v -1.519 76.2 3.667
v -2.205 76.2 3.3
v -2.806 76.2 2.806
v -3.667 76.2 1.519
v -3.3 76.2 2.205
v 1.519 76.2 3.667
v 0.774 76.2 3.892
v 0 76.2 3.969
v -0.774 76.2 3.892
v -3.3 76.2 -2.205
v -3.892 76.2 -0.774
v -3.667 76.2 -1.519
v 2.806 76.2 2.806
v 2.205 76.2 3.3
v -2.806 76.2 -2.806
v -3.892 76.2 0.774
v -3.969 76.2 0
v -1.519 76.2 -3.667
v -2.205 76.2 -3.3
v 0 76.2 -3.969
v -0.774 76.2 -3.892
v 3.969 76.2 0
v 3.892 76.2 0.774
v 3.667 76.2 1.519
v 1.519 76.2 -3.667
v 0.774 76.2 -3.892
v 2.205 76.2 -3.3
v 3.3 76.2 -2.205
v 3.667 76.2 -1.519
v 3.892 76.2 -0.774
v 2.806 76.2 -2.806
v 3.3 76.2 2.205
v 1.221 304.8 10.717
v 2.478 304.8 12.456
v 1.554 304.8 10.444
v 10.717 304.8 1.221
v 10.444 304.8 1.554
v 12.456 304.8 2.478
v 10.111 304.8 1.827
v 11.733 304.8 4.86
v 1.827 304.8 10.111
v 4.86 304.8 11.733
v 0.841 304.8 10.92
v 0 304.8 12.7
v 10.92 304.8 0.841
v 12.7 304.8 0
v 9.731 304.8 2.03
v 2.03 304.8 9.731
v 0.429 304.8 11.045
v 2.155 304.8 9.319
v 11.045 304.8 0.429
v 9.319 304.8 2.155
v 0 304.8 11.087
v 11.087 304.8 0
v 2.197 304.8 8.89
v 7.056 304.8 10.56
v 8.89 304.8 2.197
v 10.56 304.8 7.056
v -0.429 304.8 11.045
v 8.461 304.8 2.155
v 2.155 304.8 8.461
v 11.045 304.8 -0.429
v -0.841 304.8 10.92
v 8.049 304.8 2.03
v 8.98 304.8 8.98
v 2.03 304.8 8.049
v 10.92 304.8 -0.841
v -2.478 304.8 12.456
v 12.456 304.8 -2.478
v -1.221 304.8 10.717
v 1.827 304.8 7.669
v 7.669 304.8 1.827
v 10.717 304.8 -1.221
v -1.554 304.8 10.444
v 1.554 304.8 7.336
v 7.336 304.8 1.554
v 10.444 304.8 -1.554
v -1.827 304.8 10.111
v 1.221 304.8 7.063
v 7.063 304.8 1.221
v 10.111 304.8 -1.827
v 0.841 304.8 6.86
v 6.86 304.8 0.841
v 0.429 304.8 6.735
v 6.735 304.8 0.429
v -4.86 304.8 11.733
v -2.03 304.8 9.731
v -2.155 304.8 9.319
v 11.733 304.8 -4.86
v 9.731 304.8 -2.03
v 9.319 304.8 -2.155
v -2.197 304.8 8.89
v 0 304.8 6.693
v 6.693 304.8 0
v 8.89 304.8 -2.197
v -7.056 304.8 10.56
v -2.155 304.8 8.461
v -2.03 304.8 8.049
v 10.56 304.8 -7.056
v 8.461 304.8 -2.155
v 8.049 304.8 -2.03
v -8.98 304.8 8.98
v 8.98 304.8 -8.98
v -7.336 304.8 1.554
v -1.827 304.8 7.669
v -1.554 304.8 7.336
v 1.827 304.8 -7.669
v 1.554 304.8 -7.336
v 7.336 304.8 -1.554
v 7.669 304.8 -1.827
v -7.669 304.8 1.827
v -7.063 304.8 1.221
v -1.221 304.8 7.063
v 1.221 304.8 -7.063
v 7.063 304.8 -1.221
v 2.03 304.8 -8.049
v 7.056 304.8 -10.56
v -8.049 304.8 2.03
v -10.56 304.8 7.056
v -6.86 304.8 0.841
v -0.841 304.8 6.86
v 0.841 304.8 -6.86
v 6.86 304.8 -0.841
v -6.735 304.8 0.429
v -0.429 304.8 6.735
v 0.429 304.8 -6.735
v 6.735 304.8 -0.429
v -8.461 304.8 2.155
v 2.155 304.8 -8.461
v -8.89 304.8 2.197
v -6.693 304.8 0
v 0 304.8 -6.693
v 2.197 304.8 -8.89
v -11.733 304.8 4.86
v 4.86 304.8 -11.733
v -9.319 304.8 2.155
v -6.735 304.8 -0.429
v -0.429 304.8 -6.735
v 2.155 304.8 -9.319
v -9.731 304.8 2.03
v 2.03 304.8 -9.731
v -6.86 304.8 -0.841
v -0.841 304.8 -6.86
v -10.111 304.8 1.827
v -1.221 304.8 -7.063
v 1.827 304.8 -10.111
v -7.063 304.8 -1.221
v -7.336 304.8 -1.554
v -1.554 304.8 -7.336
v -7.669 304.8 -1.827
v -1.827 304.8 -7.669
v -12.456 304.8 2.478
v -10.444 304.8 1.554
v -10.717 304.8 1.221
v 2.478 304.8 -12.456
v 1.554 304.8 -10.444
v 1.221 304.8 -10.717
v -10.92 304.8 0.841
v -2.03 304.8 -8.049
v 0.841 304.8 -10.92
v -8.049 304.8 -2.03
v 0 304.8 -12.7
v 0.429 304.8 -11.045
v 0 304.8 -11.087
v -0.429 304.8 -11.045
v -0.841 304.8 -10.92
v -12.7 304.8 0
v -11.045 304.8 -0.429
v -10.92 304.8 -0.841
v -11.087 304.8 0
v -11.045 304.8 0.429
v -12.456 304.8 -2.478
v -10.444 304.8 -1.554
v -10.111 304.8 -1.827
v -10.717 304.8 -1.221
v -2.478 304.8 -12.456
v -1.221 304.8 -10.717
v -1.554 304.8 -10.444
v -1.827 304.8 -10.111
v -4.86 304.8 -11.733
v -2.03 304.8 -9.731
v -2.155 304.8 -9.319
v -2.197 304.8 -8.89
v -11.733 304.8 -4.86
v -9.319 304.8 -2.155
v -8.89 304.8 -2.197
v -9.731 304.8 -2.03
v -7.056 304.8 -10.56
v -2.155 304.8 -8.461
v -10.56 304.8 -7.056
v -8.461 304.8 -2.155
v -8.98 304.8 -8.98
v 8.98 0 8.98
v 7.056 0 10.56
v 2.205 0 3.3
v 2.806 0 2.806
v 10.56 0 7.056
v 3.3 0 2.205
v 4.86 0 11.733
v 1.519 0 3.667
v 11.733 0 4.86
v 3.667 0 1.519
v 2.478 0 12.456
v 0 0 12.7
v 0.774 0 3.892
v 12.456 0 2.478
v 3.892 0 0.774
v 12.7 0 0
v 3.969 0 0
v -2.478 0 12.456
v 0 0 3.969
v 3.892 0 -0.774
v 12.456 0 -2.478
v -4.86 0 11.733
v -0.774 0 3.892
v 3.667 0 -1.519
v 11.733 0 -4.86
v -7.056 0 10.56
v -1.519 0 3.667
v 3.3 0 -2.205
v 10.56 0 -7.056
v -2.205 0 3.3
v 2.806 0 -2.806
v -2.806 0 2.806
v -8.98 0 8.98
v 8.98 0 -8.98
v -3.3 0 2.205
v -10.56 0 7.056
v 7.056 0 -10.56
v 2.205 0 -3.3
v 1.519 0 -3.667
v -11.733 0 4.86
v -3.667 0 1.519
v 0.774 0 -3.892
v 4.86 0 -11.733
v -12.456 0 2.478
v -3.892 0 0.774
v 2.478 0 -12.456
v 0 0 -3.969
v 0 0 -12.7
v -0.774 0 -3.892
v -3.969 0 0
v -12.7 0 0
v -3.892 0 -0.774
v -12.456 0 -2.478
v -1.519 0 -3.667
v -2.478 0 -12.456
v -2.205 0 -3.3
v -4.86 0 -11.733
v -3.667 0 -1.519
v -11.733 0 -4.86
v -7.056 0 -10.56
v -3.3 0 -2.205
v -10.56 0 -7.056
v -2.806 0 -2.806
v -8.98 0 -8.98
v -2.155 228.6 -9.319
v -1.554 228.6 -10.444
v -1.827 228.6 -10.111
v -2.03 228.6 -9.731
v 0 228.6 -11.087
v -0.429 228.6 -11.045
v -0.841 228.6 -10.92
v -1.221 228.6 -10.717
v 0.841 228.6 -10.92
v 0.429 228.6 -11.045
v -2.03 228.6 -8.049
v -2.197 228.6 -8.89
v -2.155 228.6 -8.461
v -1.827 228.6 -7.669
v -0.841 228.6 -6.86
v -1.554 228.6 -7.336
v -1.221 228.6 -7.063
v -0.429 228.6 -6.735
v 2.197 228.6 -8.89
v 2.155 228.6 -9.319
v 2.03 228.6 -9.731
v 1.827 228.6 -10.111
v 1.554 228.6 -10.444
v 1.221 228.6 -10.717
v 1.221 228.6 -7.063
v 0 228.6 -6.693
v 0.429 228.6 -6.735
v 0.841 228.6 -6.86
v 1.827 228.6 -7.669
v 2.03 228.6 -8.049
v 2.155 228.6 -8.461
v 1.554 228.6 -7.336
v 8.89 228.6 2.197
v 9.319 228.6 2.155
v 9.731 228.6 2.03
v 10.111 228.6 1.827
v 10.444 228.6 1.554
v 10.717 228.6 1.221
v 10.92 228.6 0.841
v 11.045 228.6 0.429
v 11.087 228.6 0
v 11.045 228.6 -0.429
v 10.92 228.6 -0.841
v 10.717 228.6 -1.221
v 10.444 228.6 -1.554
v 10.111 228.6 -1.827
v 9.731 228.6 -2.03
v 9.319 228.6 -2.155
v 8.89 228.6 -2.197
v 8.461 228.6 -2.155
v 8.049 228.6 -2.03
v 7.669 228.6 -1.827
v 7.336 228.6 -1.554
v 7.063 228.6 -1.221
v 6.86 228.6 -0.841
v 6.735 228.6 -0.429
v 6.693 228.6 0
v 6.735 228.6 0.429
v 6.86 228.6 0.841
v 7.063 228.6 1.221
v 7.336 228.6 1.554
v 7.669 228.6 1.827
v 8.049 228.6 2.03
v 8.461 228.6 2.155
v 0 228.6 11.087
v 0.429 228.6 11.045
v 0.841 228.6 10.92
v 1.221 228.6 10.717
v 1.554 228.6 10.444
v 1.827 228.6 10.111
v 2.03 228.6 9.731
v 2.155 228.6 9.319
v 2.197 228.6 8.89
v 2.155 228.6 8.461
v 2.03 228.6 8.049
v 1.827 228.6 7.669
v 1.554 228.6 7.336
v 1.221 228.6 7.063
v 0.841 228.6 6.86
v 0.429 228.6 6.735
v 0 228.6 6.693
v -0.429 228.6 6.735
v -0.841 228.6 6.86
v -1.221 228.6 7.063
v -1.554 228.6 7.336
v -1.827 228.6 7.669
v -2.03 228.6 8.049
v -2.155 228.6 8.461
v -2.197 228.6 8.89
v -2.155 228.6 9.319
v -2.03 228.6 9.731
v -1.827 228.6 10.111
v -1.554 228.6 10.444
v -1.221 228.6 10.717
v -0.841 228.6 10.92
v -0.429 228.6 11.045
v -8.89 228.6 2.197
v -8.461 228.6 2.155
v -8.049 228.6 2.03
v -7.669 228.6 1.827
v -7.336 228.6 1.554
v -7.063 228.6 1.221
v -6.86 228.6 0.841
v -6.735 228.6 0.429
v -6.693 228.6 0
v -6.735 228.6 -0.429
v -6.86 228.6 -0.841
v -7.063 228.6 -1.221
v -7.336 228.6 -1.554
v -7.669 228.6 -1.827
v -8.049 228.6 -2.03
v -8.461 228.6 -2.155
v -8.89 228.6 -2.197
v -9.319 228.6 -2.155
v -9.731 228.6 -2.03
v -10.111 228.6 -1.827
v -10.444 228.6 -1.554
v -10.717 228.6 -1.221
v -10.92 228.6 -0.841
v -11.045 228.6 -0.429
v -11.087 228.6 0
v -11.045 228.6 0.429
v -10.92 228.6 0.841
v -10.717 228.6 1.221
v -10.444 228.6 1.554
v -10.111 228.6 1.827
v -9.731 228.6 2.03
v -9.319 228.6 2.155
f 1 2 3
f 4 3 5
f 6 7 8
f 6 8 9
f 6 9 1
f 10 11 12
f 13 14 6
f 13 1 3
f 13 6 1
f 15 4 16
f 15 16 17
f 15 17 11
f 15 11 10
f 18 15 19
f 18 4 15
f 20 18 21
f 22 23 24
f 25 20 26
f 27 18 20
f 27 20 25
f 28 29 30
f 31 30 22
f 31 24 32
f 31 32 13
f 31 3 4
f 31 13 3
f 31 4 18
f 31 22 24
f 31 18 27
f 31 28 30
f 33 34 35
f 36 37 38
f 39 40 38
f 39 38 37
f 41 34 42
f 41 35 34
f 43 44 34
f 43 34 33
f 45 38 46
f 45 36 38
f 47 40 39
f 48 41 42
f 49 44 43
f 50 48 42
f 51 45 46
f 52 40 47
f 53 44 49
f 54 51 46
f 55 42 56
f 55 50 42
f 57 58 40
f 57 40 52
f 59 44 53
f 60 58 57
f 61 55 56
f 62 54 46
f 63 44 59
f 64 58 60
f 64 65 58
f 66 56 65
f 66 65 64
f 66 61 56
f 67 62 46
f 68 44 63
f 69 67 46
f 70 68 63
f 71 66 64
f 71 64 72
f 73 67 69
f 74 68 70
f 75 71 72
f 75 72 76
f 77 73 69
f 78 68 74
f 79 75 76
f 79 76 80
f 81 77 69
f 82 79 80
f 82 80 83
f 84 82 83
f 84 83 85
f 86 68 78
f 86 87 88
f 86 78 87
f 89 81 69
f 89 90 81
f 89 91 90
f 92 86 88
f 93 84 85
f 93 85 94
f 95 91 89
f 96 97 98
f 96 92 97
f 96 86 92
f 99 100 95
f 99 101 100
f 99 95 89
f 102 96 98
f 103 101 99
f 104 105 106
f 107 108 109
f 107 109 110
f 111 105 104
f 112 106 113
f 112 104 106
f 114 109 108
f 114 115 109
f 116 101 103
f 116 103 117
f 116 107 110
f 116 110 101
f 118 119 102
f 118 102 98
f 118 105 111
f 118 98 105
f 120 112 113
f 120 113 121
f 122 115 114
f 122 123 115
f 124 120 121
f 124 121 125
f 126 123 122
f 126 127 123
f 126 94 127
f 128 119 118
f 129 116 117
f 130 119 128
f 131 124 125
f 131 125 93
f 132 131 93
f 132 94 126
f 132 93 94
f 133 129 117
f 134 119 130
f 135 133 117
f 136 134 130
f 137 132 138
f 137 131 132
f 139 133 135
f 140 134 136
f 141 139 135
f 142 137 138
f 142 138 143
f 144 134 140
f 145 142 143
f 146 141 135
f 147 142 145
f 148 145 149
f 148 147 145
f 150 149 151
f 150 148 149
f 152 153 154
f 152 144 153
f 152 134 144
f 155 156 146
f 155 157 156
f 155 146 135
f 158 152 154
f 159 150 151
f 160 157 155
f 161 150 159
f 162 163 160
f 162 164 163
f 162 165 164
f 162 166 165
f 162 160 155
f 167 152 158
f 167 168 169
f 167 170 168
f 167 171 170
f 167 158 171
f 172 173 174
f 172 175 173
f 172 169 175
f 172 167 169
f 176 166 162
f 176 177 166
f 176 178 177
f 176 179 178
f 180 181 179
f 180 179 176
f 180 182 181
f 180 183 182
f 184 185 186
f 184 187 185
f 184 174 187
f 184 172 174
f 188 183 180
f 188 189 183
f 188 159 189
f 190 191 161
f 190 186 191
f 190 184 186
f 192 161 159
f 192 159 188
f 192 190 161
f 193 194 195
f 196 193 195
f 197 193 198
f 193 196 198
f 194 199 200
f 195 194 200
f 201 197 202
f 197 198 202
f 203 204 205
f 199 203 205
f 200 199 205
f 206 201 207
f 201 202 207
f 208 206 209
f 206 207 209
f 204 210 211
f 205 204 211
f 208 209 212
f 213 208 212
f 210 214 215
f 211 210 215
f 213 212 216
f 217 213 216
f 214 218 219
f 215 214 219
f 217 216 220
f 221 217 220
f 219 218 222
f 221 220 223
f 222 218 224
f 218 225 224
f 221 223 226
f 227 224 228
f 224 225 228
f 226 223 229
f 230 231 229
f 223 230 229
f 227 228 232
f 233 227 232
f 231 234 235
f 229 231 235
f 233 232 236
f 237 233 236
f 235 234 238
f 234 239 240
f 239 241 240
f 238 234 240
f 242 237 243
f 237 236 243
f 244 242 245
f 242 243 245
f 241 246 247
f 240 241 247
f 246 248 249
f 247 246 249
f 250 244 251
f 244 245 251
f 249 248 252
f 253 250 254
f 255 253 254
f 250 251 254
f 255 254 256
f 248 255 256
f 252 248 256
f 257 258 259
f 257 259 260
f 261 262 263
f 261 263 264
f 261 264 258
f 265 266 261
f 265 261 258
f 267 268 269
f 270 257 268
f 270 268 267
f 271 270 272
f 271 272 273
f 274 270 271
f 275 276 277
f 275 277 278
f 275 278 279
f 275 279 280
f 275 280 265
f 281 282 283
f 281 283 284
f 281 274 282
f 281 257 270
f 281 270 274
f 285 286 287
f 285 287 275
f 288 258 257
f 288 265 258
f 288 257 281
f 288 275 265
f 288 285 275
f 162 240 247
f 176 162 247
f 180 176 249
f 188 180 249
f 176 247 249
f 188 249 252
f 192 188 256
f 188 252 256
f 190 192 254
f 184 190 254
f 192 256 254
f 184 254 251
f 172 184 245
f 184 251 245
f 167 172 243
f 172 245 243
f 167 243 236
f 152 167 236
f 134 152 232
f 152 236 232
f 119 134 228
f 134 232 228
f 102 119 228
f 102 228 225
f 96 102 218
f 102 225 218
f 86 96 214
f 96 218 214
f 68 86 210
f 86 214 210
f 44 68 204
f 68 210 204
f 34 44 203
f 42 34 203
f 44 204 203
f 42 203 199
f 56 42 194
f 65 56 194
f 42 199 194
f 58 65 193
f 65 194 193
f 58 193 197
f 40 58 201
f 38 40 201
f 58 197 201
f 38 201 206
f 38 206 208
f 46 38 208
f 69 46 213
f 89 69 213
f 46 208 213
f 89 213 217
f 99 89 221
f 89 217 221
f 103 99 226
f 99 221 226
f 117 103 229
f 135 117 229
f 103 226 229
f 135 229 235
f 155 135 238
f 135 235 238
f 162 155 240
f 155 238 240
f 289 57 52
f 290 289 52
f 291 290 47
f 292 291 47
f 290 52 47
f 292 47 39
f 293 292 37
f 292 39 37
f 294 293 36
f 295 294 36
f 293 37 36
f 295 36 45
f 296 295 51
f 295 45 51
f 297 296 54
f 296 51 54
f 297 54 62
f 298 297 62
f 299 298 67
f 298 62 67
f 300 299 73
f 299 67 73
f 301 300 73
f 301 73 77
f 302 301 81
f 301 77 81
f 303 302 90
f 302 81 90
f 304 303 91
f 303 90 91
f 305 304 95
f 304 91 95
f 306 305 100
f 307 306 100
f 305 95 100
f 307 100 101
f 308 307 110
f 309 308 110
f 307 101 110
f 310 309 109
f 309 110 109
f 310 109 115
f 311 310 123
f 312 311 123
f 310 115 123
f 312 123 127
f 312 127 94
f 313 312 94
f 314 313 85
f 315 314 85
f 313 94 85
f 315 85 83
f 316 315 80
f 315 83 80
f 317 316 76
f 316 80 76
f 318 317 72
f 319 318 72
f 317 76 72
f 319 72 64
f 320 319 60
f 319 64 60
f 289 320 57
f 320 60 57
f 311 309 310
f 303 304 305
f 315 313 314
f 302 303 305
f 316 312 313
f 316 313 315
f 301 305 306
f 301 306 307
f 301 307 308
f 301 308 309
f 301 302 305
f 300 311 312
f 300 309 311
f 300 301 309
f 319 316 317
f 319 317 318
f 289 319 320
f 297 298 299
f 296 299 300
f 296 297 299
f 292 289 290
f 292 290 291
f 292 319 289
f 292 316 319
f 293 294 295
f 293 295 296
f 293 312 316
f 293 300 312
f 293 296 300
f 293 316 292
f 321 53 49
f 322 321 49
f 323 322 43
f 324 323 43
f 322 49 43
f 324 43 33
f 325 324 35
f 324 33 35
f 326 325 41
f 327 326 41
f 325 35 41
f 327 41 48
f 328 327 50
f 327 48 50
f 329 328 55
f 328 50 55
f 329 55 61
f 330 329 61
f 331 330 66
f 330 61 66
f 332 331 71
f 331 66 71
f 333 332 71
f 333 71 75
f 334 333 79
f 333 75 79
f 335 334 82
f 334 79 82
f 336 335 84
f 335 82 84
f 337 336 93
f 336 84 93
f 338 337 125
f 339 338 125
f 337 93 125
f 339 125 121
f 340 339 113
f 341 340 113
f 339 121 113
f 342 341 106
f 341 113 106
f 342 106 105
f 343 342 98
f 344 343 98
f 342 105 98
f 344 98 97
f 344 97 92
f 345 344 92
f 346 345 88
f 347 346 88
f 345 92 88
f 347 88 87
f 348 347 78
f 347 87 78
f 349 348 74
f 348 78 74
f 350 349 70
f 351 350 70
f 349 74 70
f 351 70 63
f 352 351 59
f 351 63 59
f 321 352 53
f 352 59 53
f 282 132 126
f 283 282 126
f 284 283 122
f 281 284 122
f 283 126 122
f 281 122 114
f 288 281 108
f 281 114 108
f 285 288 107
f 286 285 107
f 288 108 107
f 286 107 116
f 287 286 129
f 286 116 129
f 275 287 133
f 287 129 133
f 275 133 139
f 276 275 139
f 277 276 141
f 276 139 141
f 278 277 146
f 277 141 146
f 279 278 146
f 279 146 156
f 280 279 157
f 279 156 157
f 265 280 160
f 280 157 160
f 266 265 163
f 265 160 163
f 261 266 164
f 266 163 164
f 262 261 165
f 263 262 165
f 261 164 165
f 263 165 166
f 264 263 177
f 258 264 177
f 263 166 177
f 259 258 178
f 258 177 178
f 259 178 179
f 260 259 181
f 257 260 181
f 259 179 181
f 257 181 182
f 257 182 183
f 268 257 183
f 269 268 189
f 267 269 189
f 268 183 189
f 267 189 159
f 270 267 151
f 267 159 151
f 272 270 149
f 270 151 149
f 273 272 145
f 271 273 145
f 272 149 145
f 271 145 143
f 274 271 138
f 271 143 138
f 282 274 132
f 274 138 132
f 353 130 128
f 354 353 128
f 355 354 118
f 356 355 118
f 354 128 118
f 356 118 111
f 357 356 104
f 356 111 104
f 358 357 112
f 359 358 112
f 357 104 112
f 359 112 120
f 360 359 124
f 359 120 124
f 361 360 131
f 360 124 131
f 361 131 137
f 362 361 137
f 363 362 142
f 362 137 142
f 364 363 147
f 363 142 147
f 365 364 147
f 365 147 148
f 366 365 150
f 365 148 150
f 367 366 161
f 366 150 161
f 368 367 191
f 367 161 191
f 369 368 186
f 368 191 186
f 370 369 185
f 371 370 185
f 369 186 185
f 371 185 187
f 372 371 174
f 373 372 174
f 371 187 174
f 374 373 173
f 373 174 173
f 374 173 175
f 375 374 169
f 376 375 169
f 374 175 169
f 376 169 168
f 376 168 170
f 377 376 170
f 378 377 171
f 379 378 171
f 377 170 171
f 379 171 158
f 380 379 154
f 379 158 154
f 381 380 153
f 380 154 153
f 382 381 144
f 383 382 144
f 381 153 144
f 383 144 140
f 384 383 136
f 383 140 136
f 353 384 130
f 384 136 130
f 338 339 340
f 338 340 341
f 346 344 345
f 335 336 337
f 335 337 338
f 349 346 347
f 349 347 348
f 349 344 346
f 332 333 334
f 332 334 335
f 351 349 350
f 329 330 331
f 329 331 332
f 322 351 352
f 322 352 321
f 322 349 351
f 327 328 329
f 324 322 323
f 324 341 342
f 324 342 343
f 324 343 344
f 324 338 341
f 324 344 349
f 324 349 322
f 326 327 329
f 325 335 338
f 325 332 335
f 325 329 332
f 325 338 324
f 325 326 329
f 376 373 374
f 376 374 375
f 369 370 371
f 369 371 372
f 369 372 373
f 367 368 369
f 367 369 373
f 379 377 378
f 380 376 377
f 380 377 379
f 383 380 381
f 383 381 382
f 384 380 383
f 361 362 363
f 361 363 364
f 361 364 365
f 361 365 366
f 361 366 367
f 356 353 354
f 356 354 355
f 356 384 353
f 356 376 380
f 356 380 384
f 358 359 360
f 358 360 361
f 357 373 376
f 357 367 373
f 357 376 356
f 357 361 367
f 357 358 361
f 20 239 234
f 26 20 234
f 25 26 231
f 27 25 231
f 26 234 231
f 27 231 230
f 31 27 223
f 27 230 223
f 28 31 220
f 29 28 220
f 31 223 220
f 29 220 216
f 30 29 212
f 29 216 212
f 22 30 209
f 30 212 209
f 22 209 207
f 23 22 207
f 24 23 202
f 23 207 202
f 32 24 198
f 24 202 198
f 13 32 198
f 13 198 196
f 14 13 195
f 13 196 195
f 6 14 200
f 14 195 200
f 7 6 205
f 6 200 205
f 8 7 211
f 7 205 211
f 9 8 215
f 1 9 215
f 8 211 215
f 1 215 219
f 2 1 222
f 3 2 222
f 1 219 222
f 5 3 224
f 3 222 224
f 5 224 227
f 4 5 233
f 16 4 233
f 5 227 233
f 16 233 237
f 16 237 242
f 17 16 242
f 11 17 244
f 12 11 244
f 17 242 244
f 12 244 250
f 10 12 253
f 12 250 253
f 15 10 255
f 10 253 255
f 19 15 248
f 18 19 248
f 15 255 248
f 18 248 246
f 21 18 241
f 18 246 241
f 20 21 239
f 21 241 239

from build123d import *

# Parameters (mm, degrees)
SKETCH1_R           = 12.7
BOSS_EXTRUDE1_DEPTH = 304.8
SKETCH2_R           = 3.96875
CUT_EXTRUDE1_DEPTH  = 76.2
SKETCH3_R           = 2.1971
CUT_EXTRUDE2_DEPTH  = 76.2


with BuildPart() as part:
    # Sketch1 → Boss-Extrude1 (new body)
    with BuildSketch(Plane(origin=(0, 0, 0), x_dir=(1, 0, 0), z_dir=(0, 1, 0))):
        with Locations(Location((0, 0, 0), (0, 0, 90))):
            Circle(SKETCH1_R)
    extrude(amount=BOSS_EXTRUDE1_DEPTH)

    # Sketch2 → Cut-Extrude1 (cut)
    with BuildSketch(Plane.XZ):
        with Locations(Location((0, 0, 0), (0, 0, 270))):
            Circle(SKETCH2_R)
    extrude(amount=-CUT_EXTRUDE1_DEPTH, mode=Mode.SUBTRACT)

    # Sketch3 → Cut-Extrude2 (cut)
    with BuildSketch(Plane(origin=(0, 304.8, 0), x_dir=(1, 0, 0), z_dir=(0, 1, 0))):
        with Locations(Location((0, 8.89, 0), (0, 0, 270))):
            Circle(SKETCH3_R)
        with Locations(Location((8.89, 0, 0), (0, 0, 270))):
            Circle(SKETCH3_R)
        with Locations(Location((0, -8.89, 0), (0, 0, 270))):
            Circle(SKETCH3_R)
        with Locations(Location((-8.89, 0, 0), (0, 0, 270))):
            Circle(SKETCH3_R)
    extrude(amount=-CUT_EXTRUDE2_DEPTH, mode=Mode.SUBTRACT)


solid = part.part
